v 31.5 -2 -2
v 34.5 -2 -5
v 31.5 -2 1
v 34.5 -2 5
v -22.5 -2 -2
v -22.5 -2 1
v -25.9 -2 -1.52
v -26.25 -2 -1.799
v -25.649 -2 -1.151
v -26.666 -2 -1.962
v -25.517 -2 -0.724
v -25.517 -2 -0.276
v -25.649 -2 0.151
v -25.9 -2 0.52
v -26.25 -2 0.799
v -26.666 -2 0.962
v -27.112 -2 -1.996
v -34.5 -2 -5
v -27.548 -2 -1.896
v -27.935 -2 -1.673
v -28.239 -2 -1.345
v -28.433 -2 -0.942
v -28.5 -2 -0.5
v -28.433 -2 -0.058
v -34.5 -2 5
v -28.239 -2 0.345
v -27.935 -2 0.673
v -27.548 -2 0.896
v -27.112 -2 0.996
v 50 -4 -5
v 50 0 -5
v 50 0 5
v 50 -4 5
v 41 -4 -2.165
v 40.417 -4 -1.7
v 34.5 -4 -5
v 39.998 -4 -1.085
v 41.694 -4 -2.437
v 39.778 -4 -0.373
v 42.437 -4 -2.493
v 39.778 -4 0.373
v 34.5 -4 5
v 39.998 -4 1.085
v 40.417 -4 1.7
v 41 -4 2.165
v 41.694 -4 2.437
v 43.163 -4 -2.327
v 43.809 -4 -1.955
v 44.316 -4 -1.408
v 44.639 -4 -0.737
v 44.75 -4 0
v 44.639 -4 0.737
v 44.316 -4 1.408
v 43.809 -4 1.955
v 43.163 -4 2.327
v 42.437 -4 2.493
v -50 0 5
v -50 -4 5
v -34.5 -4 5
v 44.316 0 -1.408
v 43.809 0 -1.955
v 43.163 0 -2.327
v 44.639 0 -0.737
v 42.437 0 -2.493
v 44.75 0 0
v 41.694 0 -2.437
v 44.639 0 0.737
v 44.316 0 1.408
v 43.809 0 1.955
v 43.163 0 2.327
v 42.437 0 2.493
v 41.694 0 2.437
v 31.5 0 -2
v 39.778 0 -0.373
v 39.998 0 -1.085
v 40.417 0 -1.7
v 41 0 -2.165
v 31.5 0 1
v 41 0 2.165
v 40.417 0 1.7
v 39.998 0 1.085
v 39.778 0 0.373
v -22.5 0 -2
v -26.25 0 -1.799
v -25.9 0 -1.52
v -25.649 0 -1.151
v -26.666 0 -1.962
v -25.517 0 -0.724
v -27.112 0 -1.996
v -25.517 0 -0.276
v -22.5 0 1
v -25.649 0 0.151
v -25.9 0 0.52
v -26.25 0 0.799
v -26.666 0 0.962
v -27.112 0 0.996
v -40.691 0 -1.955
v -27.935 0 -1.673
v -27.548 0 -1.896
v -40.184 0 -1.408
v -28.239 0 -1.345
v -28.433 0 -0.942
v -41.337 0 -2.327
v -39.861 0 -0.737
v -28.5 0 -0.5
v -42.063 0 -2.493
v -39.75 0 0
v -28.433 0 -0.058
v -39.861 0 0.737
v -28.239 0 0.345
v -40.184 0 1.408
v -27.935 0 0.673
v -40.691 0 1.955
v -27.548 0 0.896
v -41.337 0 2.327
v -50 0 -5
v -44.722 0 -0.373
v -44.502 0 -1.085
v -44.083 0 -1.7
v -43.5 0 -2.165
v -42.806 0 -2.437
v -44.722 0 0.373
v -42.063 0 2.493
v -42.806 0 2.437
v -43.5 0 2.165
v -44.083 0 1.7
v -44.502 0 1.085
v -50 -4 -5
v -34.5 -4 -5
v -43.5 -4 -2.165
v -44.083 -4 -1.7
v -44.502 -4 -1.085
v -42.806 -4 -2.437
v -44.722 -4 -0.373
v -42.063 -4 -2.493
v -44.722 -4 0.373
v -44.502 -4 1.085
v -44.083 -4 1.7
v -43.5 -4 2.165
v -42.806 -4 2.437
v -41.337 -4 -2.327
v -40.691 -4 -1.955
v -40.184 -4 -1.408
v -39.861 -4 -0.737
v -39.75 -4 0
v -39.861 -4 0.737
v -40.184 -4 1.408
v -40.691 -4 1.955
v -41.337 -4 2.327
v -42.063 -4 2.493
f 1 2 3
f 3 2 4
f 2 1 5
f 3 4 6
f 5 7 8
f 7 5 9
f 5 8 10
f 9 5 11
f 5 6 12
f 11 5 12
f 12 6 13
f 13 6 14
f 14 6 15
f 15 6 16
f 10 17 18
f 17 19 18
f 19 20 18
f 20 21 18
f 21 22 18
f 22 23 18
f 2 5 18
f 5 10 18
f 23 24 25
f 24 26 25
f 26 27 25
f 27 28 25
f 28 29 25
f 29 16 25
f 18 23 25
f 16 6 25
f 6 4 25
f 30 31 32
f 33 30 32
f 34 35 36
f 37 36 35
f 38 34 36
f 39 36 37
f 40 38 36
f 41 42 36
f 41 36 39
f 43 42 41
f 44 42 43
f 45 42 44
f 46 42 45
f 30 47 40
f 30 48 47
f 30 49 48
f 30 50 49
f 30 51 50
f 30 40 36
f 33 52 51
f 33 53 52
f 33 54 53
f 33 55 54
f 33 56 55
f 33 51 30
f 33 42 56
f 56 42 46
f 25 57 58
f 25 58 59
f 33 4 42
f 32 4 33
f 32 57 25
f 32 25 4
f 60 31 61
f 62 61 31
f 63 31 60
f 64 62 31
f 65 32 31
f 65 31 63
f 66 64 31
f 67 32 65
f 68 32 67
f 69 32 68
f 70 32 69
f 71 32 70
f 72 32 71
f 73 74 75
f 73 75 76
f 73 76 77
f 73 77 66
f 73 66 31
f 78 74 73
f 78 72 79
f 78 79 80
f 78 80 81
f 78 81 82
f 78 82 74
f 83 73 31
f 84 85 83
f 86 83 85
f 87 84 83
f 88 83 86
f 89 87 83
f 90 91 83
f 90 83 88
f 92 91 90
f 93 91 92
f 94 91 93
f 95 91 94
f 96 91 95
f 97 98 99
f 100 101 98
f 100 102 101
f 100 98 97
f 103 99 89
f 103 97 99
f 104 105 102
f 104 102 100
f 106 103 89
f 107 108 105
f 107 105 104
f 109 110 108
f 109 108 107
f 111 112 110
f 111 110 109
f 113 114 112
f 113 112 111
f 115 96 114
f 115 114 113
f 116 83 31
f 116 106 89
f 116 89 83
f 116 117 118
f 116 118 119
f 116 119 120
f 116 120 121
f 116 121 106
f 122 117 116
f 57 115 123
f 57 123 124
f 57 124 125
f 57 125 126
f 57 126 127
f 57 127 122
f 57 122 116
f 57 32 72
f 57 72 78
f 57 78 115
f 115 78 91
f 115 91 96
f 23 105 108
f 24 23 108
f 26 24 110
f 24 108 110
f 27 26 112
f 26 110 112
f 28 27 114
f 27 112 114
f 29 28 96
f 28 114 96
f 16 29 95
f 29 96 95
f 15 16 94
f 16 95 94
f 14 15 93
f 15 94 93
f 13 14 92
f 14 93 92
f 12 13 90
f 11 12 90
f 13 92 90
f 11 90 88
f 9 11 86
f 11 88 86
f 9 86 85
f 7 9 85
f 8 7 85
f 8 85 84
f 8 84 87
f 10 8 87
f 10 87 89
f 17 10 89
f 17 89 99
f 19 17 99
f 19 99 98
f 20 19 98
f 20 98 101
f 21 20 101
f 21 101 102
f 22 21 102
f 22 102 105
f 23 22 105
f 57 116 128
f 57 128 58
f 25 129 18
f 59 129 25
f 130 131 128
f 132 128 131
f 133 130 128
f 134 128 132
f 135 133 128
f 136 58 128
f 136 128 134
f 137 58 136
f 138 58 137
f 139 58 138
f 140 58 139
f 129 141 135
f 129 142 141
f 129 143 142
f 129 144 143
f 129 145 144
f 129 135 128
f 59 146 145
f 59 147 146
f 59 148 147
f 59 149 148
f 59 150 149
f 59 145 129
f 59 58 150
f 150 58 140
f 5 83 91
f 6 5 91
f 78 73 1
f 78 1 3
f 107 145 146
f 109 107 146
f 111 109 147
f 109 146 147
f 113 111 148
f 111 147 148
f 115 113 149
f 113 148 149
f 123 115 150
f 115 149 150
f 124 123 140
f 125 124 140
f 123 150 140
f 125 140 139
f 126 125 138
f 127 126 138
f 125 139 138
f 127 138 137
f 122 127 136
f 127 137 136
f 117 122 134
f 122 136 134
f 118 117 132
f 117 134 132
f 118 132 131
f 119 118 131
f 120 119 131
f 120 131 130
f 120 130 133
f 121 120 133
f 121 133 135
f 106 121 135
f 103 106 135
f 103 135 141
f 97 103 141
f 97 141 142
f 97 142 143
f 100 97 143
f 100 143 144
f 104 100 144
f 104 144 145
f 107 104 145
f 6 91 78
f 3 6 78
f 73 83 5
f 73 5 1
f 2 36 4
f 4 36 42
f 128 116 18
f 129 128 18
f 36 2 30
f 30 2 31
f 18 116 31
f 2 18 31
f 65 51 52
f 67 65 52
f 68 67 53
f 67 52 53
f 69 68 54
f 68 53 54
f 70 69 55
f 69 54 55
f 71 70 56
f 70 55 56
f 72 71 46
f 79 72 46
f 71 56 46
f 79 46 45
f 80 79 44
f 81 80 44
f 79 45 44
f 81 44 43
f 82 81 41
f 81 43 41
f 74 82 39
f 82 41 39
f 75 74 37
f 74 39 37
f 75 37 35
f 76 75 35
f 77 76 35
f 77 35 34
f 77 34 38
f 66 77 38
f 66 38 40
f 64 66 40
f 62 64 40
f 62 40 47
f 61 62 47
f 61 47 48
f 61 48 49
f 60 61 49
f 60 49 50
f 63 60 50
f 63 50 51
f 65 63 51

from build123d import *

# Parameters (mm, degrees)
F0_W      = 100
F0_H      = 10
F0_W_2    = 63
F0_H_2    = 3
F1_DEPTH  = 4
F2_W      = 69
F2_H      = 10
F3_DEPTH  = 2
F4_R      = 2.5
F5_DEPTH  = 25
F6_R      = 2.5
F7_DEPTH  = 25
F8_W      = 9
F8_H      = 3
F9_DEPTH  = 2
F10_R     = 1.5
F11_DEPTH = 25


with BuildPart() as f1:
    # F0 (on Front) → F1 (new body)
    with BuildSketch(Plane.XZ):
        Rectangle(F0_W, F0_H)
        with Locations((0, -0.5)):
            Rectangle(F0_W_2, F0_H_2, mode=Mode.SUBTRACT)
    extrude(amount=F1_DEPTH)

    # F2 (on face) → F3 (cut)
    with BuildSketch(Plane.XZ.offset(4)):
        Rectangle(F2_W, F2_H)
    extrude(amount=-F3_DEPTH, mode=Mode.SUBTRACT)

    # F4 (on face) → F5 (cut)
    with BuildSketch(Plane.XZ.offset(4)):
        with Locations((-42.25, 0)):
            Circle(F4_R)
    extrude(amount=-F5_DEPTH, mode=Mode.SUBTRACT)

    # F6 (on face) → F7 (cut)
    with BuildSketch(Plane.XZ.offset(4)):
        with Locations((42.25, 0)):
            Circle(F6_R)
    extrude(amount=-F7_DEPTH, mode=Mode.SUBTRACT)

    # F8 (on face) → F9 (join)
    with BuildSketch(Plane(origin=(0, 0, 0), x_dir=(-1, 0, 0), z_dir=(0, 1, 0))):
        with Locations((27, -0.5)):
            Rectangle(F8_W, F8_H)
    extrude(amount=-F9_DEPTH)

    # F10 (on face) → F11 (cut)
    with BuildSketch(Plane(origin=(0, 0, 0), x_dir=(-1, 0, 0), z_dir=(0, 1, 0))):
        with Locations((27, -0.5)):
            Circle(F10_R)
    extrude(amount=-F11_DEPTH, mode=Mode.SUBTRACT)


solid = f1.part
